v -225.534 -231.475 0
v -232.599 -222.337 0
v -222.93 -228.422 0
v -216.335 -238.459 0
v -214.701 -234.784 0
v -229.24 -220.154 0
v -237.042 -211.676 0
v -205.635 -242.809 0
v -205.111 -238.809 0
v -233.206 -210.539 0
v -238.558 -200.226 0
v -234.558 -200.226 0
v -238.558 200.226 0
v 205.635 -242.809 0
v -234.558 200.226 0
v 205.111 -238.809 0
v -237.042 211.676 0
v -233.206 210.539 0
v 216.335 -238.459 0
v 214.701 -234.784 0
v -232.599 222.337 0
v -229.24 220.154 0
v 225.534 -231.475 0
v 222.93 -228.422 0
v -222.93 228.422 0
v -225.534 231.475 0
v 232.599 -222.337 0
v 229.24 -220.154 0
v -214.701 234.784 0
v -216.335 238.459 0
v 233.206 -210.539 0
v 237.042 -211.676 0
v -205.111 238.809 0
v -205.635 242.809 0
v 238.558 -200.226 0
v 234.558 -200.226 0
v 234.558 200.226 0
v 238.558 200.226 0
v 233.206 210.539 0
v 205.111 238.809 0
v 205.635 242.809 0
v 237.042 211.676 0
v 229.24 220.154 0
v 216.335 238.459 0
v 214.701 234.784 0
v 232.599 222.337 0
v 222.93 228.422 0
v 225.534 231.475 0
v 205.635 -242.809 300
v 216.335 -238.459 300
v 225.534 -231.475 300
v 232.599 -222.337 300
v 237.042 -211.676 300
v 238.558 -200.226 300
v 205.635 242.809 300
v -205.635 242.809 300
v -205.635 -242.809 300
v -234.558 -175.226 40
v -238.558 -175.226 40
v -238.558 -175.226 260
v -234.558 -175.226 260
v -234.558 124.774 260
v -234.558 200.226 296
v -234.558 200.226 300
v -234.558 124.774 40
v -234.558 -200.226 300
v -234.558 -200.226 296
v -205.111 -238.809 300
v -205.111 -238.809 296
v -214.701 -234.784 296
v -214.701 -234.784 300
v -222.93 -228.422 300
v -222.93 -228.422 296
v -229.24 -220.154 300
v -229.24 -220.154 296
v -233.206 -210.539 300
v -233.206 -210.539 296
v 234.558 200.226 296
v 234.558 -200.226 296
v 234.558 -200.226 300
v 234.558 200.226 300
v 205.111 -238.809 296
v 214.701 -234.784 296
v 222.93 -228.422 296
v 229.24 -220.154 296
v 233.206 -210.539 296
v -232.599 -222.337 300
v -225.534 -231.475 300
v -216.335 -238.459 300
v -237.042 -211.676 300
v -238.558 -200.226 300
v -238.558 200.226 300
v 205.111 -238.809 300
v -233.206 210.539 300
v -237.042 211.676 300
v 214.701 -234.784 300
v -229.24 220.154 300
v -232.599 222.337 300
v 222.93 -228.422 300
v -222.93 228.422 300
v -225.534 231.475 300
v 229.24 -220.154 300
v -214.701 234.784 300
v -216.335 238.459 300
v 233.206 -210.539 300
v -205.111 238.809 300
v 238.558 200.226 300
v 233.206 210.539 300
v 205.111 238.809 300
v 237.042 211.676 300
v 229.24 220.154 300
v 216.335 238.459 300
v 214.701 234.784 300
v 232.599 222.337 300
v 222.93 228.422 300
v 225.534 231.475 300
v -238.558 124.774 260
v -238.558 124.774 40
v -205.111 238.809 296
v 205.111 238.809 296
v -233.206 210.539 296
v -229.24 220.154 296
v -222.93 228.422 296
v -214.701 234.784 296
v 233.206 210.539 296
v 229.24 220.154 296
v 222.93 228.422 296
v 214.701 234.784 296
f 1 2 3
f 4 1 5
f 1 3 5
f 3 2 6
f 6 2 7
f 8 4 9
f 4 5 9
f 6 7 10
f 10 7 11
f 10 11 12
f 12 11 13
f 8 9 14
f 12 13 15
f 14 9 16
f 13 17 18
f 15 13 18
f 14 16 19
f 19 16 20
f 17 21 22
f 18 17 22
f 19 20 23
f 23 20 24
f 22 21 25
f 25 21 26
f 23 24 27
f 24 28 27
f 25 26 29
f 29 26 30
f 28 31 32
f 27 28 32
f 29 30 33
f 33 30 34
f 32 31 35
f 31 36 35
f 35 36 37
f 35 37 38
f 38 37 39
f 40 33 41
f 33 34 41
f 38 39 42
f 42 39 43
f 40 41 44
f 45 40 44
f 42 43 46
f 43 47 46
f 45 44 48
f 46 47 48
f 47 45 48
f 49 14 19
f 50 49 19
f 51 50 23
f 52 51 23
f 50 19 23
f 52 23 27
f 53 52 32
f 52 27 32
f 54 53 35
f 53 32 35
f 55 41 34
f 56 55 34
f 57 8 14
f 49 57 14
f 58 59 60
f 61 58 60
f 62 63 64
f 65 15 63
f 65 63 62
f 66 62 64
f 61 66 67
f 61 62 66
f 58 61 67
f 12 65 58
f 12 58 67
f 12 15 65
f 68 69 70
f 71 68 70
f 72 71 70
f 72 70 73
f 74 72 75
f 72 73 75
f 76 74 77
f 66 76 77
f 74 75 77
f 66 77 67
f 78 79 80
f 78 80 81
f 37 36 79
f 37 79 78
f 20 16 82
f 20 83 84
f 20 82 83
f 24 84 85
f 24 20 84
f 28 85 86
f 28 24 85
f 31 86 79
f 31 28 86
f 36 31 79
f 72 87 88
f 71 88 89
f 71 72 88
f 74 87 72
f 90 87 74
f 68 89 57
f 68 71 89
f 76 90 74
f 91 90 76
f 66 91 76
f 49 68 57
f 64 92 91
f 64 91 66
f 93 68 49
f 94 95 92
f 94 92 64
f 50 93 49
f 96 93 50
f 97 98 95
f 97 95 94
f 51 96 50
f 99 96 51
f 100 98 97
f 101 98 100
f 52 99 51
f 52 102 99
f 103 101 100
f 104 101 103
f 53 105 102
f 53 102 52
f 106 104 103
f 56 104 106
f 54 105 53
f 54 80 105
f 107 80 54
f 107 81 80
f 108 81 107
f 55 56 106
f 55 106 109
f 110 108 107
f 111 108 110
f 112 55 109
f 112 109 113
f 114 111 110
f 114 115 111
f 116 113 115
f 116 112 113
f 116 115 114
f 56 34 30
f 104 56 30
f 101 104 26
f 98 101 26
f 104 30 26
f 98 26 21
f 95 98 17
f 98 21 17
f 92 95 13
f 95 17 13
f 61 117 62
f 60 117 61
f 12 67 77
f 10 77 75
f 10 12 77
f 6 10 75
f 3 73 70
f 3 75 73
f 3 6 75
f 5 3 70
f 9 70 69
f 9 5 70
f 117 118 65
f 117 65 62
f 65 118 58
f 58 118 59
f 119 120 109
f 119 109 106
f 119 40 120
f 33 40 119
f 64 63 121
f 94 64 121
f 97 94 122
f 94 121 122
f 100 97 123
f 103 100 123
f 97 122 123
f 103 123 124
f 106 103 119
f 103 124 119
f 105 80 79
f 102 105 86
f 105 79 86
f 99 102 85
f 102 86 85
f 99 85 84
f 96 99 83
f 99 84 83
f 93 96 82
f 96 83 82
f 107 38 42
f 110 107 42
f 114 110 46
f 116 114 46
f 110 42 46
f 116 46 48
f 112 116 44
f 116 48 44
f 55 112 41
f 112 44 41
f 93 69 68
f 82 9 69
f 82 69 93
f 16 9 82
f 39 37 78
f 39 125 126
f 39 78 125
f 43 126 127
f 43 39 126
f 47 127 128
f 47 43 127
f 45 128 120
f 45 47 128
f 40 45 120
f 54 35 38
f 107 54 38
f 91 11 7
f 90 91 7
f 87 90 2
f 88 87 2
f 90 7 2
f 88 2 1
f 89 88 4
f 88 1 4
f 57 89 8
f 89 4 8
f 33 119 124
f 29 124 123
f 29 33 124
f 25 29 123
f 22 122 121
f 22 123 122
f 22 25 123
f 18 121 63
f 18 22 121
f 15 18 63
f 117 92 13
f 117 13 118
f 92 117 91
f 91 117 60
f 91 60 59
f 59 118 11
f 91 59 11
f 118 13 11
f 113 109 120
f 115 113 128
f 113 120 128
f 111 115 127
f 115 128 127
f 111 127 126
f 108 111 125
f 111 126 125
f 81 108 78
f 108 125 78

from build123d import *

# Parameters (mm, degrees)
F1_DEPTH = 300
F2_T     = -4
F4_DEPTH = 25
F5_W     = 300
F5_H     = 220
F6_DEPTH = 25


with BuildPart() as f1:
    # F0 (on Top) → F1 (new body)
    with BuildSketch(Plane.XY):
        with BuildLine():
            Line((205.635, 242.809), (-205.635, 242.809))
            ThreePointArc((-205.635, 242.809), (-229.3674, 227.138989), (-238.558, 200.226))
            Line((-238.558, 200.226), (-238.558, -200.226))
            ThreePointArc((-238.558, -200.226), (-229.3674, -227.138989), (-205.635, -242.809))
            Line((-205.635, -242.809), (205.635, -242.809))
            ThreePointArc((205.635, -242.809), (229.367438, -227.139018), (238.558, -200.226))
            Line((238.558, -200.226), (238.558, 200.226))
            ThreePointArc((238.558, 200.226), (229.367438, 227.139018), (205.635, 242.809))
        make_face()
    extrude(amount=F1_DEPTH)

    # F2
    f2_openings = [f1.faces().sort_by_distance(p)[0] for p in [
        (4e-06, 0, 0),
    ]]
    offset(amount=F2_T, openings=f2_openings)

    # F3 (on face) → F4 (cut)
    with BuildSketch(Plane(origin=(0, 0, 296), x_dir=(1, 0, 0), z_dir=(0, 0, -1))):
        with BuildLine():
            ThreePointArc((-205.110852, 238.809), (-226.355128, 224.494202), (-234.558, 200.226))
            Line((-234.558, 200.226), (-234.558, -200.226))
            ThreePointArc((-234.558, -200.226), (-226.355128, -224.494202), (-205.110852, -238.809))
            Line((-205.110852, -238.809), (205.110858, -238.809))
            ThreePointArc((205.110858, -238.809), (226.35513, -224.494207), (234.558, -200.226013))
            Line((234.558, -200.226013), (234.558, 200.226))
            ThreePointArc((234.558, 200.226), (226.35513, 224.4942), (205.110858, 238.809))
            Line((205.110858, 238.809), (-205.110852, 238.809))
        make_face()
    extrude(amount=-F4_DEPTH, mode=Mode.SUBTRACT)

    # F5 (on face) → F6 (cut)
    with BuildSketch(Plane(origin=(-238.558, 0, 0), x_dir=(0, -1, 0), z_dir=(-1, 0, 0))):
        with Locations((25.226, 150)):
            Rectangle(F5_W, F5_H)
    extrude(amount=-F6_DEPTH, mode=Mode.SUBTRACT)


solid = f1.part
